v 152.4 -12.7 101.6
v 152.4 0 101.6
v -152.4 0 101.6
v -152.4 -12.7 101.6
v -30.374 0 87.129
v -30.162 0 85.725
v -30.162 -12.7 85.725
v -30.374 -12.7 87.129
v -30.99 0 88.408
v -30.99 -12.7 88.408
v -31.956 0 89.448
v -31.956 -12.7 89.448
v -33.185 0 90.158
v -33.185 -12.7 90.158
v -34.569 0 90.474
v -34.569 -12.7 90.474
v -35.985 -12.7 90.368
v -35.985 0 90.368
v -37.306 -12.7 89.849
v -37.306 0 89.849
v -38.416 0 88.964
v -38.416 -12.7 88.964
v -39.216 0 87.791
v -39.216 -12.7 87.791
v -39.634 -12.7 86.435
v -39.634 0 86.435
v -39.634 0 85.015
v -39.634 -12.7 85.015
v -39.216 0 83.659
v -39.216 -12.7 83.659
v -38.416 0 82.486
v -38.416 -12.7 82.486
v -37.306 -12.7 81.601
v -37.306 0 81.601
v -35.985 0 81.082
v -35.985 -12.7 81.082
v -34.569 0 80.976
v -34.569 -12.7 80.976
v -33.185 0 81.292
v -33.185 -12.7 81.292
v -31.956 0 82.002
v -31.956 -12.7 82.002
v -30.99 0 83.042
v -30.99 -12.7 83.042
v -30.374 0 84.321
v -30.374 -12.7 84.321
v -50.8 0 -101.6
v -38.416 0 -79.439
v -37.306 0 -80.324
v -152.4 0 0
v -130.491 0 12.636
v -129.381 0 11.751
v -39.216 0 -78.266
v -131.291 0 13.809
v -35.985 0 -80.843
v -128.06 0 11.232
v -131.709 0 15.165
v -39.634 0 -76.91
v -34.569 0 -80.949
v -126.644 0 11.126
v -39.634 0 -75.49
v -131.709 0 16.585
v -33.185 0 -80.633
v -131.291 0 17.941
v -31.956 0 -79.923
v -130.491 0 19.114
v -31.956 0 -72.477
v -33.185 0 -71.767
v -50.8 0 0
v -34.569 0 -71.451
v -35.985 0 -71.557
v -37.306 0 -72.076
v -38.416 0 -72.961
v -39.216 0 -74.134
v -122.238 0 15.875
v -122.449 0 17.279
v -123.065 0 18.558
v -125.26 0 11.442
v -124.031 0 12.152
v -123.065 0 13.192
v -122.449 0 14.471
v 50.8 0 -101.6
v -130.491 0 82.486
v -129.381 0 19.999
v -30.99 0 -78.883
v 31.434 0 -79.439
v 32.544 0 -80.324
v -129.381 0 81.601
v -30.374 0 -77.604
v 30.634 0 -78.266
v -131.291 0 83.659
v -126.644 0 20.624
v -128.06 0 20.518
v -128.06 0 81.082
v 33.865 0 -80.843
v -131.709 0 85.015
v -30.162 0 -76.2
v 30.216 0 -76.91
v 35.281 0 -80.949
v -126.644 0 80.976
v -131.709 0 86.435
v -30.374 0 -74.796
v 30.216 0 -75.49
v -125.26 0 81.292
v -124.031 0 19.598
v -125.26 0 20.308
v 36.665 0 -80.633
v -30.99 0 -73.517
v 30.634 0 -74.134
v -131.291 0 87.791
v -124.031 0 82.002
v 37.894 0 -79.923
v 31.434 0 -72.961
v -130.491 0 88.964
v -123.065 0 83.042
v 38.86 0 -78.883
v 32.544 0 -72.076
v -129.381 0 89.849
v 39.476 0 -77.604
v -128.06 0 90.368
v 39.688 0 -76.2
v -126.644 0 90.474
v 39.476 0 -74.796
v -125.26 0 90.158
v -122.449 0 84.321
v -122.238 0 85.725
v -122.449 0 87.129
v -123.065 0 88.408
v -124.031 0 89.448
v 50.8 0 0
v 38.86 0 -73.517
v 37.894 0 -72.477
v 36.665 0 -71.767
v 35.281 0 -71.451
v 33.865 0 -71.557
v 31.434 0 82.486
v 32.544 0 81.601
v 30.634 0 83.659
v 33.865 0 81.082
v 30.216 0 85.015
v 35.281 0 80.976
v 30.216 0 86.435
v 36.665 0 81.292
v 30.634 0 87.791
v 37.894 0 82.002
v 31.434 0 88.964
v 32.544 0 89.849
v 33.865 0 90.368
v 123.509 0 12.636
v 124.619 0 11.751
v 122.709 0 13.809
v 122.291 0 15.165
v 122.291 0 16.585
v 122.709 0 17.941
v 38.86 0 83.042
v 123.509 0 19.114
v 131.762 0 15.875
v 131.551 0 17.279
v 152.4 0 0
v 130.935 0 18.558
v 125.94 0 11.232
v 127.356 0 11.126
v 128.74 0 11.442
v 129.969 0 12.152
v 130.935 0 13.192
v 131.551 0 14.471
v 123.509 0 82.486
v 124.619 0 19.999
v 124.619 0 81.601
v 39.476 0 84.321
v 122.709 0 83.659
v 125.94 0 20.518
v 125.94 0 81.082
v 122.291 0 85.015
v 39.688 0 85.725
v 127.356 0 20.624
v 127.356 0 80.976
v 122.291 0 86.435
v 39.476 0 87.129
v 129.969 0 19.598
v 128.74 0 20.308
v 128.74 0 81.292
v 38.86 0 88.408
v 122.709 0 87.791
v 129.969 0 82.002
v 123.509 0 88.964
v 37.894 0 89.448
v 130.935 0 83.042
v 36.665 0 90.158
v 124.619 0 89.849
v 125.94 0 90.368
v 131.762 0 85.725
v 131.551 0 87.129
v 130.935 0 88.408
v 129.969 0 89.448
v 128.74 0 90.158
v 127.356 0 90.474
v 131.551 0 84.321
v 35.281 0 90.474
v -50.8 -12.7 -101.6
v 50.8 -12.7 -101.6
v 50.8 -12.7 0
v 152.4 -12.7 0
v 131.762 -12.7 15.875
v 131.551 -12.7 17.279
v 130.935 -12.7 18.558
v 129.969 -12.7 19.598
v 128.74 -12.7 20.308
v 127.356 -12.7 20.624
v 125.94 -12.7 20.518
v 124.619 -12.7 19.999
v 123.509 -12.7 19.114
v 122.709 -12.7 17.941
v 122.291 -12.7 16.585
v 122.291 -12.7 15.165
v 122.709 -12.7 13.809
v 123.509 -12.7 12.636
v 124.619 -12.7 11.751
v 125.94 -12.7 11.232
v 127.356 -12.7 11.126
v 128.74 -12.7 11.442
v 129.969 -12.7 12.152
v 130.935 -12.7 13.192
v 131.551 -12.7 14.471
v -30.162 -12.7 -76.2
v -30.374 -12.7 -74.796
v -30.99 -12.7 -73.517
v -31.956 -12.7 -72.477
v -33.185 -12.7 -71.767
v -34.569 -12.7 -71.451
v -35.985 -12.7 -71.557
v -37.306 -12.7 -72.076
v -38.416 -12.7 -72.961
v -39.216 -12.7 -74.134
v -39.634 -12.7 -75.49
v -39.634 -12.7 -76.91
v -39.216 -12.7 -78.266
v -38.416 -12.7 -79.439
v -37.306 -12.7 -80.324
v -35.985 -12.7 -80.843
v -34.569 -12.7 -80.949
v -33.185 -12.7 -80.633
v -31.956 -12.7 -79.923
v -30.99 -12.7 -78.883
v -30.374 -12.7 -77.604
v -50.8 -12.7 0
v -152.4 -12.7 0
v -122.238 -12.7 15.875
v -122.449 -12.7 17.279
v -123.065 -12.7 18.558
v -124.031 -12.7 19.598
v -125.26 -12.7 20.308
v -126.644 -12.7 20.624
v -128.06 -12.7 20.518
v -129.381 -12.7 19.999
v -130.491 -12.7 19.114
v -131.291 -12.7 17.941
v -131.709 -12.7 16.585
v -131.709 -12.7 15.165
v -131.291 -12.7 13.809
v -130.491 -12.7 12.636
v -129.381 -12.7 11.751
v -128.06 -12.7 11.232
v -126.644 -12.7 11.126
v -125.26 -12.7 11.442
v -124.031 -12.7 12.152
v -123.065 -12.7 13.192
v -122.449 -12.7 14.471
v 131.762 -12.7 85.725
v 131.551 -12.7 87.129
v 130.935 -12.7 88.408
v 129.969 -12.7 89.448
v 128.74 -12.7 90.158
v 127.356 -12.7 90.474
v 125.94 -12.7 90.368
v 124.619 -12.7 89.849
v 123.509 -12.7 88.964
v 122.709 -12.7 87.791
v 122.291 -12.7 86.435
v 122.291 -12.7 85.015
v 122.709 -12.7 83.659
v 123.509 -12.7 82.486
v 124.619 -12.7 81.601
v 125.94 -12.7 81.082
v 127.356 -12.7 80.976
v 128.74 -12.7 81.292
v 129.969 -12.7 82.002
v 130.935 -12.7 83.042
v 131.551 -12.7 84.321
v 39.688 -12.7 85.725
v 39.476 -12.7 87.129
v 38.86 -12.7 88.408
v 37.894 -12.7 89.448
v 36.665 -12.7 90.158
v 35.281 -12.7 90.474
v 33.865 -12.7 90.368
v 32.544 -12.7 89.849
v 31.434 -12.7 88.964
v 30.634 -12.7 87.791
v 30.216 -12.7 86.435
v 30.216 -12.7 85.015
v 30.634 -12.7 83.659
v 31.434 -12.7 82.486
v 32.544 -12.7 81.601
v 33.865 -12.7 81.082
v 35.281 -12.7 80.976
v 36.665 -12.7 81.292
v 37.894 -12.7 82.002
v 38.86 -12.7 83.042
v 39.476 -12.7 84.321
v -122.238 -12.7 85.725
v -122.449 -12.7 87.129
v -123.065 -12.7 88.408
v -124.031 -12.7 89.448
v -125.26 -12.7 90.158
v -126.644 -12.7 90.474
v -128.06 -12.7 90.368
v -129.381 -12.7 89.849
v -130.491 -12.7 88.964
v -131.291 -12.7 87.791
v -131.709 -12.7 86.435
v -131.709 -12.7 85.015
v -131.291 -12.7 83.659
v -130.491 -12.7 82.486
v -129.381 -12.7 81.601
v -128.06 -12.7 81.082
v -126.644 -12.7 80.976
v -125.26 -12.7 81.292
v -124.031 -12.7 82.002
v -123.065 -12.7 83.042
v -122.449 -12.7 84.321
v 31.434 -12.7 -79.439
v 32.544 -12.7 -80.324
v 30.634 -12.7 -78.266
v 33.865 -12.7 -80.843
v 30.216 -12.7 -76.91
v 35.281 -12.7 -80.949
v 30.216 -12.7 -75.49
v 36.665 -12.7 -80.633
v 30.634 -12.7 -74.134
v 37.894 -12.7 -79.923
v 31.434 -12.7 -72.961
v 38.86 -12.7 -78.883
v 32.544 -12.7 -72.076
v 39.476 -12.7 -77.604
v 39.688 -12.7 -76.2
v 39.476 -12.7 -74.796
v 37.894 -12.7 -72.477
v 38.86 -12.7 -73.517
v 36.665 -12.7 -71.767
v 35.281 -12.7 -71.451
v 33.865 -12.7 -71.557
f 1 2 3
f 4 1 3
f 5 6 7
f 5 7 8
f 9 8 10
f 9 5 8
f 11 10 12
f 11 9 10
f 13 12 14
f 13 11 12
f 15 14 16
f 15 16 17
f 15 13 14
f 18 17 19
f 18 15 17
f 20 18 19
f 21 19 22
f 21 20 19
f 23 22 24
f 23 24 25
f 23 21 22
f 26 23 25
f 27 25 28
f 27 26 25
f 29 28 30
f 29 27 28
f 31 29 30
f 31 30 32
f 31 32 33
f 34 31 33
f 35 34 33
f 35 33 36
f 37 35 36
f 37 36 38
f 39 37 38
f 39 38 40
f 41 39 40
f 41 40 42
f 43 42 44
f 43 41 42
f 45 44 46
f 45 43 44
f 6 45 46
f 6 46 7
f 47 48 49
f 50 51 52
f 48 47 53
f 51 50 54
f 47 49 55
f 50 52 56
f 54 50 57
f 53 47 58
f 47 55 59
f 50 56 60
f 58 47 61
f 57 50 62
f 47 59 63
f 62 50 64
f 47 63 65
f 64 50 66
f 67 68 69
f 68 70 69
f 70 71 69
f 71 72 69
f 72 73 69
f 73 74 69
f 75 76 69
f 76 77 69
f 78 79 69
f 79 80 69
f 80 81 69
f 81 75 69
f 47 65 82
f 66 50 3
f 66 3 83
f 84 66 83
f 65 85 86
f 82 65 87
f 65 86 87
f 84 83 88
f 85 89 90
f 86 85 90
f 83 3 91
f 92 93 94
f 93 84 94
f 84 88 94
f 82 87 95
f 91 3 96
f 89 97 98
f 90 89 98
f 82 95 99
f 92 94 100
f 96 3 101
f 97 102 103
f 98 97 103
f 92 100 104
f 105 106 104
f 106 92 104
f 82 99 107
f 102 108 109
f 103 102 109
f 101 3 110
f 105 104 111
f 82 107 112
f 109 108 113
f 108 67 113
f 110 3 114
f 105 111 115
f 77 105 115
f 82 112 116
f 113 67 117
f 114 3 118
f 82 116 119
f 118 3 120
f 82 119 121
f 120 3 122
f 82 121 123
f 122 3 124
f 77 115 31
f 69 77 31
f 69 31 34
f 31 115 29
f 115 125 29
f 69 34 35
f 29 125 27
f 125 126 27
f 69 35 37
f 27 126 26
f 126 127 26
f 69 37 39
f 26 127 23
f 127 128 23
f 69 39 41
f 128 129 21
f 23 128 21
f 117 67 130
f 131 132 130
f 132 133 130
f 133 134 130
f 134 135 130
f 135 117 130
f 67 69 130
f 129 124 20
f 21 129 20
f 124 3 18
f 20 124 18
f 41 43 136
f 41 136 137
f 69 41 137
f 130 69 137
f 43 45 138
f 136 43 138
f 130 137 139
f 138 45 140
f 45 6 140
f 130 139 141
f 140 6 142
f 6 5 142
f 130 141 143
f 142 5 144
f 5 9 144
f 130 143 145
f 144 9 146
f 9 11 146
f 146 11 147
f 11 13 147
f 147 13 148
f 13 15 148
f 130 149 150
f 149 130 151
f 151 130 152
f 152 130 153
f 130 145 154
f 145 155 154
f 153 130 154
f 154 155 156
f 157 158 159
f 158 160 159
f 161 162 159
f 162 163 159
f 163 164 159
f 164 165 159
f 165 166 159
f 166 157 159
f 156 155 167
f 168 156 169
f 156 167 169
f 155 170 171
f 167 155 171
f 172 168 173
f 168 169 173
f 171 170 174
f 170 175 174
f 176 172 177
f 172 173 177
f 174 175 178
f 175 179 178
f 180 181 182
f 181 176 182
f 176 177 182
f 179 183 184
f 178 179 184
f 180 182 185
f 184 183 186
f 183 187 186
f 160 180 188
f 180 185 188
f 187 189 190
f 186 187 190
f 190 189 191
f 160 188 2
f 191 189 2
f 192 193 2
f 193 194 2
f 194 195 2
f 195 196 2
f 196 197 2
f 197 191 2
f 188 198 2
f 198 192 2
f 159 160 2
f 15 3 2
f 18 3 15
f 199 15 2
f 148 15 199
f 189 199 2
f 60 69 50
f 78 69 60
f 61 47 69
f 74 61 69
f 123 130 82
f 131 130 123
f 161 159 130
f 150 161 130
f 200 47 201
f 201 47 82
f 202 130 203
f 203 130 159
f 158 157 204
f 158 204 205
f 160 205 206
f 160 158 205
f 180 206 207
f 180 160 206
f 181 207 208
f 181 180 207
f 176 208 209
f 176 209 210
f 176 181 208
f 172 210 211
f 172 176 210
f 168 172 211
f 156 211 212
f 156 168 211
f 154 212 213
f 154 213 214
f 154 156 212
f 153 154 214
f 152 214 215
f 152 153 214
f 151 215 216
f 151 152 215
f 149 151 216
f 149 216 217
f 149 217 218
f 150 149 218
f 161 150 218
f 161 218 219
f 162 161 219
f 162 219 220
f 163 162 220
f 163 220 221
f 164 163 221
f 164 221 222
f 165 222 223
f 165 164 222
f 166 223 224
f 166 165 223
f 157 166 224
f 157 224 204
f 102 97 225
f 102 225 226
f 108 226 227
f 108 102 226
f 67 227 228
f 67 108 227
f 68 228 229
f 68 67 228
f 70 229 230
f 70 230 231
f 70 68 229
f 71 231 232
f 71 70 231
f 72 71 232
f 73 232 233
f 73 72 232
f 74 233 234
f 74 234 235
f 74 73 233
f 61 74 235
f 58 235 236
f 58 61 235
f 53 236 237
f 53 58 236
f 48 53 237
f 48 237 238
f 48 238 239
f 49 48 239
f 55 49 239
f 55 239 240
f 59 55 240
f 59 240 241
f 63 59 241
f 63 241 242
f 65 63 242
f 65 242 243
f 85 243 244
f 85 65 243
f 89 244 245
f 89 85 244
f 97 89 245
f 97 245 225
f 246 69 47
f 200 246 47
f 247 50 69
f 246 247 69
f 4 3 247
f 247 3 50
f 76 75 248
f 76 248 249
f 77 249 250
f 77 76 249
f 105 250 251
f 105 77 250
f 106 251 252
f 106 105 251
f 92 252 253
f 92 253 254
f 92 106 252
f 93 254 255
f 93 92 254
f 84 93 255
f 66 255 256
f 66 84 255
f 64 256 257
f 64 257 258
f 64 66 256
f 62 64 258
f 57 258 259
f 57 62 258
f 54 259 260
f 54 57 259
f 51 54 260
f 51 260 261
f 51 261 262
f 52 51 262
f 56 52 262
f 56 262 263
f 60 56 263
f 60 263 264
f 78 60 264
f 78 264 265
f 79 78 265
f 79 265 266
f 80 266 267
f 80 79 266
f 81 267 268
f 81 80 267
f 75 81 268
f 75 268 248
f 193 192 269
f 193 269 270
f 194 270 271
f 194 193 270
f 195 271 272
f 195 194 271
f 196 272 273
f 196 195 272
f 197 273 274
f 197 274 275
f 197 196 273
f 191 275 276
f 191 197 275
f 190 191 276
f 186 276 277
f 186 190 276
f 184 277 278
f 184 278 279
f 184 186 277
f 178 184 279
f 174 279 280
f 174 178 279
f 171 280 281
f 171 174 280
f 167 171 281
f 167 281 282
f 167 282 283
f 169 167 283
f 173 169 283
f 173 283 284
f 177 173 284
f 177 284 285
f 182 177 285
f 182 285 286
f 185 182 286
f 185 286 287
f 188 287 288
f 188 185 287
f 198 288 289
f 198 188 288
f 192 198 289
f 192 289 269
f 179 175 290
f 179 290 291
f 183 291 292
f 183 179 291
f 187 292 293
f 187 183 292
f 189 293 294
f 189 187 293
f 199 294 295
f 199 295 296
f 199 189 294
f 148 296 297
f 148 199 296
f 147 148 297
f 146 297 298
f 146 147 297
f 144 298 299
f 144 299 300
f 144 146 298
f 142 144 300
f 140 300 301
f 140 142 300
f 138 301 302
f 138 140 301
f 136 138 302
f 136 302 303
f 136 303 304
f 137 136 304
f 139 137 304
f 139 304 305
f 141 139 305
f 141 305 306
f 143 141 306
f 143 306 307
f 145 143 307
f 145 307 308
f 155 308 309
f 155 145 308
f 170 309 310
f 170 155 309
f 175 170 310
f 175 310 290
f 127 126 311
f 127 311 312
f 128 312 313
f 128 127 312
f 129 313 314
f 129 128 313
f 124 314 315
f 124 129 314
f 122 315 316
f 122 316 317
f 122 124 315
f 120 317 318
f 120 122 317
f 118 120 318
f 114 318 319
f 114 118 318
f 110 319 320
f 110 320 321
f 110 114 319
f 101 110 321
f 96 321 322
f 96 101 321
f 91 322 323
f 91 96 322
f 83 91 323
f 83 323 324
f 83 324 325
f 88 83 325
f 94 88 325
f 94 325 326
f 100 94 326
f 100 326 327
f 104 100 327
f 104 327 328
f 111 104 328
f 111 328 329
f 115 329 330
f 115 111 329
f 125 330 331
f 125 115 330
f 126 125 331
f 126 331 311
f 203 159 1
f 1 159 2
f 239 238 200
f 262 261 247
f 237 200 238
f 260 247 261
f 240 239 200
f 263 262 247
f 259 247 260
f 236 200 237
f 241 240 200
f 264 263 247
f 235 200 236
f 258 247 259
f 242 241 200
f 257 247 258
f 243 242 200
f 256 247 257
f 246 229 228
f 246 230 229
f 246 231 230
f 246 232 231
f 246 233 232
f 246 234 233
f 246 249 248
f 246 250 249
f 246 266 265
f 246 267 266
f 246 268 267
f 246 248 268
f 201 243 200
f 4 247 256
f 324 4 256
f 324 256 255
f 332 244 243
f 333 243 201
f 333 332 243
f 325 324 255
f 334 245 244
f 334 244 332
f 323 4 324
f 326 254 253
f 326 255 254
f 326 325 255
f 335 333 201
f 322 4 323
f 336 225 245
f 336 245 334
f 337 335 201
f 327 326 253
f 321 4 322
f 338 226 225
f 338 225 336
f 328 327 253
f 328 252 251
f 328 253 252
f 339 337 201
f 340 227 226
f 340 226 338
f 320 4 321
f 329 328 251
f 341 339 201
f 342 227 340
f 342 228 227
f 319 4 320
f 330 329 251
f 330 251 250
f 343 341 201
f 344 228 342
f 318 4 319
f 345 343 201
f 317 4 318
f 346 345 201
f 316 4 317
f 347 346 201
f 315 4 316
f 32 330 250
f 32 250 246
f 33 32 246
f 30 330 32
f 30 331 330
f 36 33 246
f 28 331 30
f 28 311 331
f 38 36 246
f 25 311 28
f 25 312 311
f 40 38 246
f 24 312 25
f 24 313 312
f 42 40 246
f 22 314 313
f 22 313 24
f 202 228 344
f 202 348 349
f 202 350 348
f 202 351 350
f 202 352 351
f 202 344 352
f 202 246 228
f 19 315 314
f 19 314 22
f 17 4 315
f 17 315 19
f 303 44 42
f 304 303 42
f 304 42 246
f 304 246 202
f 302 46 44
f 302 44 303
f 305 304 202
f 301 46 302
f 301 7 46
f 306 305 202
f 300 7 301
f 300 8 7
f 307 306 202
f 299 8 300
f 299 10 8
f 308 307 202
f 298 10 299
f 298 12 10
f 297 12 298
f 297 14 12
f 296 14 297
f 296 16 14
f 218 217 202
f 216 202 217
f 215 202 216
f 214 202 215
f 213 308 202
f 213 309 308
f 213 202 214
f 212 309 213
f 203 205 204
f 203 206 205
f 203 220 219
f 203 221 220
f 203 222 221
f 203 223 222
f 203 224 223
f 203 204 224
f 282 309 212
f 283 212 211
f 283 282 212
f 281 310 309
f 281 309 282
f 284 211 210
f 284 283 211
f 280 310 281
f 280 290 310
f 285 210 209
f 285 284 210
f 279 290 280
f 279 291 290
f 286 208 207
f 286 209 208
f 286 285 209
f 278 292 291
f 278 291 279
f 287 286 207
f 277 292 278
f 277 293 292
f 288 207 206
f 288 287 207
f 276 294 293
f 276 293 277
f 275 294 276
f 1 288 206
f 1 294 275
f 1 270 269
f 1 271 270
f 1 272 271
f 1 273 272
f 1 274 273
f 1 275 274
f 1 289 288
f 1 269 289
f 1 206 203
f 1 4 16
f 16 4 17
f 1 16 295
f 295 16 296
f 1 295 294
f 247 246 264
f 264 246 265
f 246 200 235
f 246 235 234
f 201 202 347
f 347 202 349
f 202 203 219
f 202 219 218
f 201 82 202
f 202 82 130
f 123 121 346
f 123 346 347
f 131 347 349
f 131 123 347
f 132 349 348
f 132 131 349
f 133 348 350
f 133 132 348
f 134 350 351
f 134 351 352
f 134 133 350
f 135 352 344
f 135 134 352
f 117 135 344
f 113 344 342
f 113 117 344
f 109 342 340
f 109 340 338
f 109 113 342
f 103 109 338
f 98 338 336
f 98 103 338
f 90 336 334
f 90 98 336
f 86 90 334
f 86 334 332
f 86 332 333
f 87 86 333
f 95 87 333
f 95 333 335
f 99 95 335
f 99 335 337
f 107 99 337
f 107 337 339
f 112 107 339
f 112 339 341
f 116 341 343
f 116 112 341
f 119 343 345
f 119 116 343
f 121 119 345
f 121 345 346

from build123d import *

# Parameters (mm, degrees)
F0_W     = 101.6
F0_H     = 50.8
F0_R     = 4.7625
F1_DEPTH = 12.7


with BuildPart() as f1:
    # F0 (on Front) → F1 (new body)
    with BuildSketch(Plane.XZ):
        with Locations((0, 76.2)):
            Rectangle(F0_W, F0_H)
        with Locations((-34.925, 85.725)):
            Circle(F0_R, mode=Mode.SUBTRACT)
        with Locations((34.925, 85.725)):
            Circle(F0_R, mode=Mode.SUBTRACT)
        with Locations((101.6, 76.2)):
            Rectangle(F0_W, F0_H)
        with Locations((127, 85.725)):
            Circle(F0_R, mode=Mode.SUBTRACT)
        with Locations((-101.6, 76.2)):
            Rectangle(F0_W, F0_H)
        with Locations((-127, 85.725)):
            Circle(F0_R, mode=Mode.SUBTRACT)
        with Locations((101.6, 25.4)):
            Rectangle(F0_W, F0_H)
        with Locations((127, 15.875)):
            Circle(F0_R, mode=Mode.SUBTRACT)
        Polygon((50.8, 0), (50.8, 50.8), (-50.8, 50.8), (-50.8, 0), (-50.8, -101.6), (50.8, -101.6), align=None)
        with Locations((-34.925, -76.2)):
            Circle(F0_R, mode=Mode.SUBTRACT)
        with Locations((34.925, -76.2)):
            Circle(F0_R, mode=Mode.SUBTRACT)
        with Locations((-101.6, 25.4)):
            Rectangle(F0_W, F0_H)
        with Locations((-127, 15.875)):
            Circle(F0_R, mode=Mode.SUBTRACT)
    extrude(amount=F1_DEPTH)


solid = f1.part
